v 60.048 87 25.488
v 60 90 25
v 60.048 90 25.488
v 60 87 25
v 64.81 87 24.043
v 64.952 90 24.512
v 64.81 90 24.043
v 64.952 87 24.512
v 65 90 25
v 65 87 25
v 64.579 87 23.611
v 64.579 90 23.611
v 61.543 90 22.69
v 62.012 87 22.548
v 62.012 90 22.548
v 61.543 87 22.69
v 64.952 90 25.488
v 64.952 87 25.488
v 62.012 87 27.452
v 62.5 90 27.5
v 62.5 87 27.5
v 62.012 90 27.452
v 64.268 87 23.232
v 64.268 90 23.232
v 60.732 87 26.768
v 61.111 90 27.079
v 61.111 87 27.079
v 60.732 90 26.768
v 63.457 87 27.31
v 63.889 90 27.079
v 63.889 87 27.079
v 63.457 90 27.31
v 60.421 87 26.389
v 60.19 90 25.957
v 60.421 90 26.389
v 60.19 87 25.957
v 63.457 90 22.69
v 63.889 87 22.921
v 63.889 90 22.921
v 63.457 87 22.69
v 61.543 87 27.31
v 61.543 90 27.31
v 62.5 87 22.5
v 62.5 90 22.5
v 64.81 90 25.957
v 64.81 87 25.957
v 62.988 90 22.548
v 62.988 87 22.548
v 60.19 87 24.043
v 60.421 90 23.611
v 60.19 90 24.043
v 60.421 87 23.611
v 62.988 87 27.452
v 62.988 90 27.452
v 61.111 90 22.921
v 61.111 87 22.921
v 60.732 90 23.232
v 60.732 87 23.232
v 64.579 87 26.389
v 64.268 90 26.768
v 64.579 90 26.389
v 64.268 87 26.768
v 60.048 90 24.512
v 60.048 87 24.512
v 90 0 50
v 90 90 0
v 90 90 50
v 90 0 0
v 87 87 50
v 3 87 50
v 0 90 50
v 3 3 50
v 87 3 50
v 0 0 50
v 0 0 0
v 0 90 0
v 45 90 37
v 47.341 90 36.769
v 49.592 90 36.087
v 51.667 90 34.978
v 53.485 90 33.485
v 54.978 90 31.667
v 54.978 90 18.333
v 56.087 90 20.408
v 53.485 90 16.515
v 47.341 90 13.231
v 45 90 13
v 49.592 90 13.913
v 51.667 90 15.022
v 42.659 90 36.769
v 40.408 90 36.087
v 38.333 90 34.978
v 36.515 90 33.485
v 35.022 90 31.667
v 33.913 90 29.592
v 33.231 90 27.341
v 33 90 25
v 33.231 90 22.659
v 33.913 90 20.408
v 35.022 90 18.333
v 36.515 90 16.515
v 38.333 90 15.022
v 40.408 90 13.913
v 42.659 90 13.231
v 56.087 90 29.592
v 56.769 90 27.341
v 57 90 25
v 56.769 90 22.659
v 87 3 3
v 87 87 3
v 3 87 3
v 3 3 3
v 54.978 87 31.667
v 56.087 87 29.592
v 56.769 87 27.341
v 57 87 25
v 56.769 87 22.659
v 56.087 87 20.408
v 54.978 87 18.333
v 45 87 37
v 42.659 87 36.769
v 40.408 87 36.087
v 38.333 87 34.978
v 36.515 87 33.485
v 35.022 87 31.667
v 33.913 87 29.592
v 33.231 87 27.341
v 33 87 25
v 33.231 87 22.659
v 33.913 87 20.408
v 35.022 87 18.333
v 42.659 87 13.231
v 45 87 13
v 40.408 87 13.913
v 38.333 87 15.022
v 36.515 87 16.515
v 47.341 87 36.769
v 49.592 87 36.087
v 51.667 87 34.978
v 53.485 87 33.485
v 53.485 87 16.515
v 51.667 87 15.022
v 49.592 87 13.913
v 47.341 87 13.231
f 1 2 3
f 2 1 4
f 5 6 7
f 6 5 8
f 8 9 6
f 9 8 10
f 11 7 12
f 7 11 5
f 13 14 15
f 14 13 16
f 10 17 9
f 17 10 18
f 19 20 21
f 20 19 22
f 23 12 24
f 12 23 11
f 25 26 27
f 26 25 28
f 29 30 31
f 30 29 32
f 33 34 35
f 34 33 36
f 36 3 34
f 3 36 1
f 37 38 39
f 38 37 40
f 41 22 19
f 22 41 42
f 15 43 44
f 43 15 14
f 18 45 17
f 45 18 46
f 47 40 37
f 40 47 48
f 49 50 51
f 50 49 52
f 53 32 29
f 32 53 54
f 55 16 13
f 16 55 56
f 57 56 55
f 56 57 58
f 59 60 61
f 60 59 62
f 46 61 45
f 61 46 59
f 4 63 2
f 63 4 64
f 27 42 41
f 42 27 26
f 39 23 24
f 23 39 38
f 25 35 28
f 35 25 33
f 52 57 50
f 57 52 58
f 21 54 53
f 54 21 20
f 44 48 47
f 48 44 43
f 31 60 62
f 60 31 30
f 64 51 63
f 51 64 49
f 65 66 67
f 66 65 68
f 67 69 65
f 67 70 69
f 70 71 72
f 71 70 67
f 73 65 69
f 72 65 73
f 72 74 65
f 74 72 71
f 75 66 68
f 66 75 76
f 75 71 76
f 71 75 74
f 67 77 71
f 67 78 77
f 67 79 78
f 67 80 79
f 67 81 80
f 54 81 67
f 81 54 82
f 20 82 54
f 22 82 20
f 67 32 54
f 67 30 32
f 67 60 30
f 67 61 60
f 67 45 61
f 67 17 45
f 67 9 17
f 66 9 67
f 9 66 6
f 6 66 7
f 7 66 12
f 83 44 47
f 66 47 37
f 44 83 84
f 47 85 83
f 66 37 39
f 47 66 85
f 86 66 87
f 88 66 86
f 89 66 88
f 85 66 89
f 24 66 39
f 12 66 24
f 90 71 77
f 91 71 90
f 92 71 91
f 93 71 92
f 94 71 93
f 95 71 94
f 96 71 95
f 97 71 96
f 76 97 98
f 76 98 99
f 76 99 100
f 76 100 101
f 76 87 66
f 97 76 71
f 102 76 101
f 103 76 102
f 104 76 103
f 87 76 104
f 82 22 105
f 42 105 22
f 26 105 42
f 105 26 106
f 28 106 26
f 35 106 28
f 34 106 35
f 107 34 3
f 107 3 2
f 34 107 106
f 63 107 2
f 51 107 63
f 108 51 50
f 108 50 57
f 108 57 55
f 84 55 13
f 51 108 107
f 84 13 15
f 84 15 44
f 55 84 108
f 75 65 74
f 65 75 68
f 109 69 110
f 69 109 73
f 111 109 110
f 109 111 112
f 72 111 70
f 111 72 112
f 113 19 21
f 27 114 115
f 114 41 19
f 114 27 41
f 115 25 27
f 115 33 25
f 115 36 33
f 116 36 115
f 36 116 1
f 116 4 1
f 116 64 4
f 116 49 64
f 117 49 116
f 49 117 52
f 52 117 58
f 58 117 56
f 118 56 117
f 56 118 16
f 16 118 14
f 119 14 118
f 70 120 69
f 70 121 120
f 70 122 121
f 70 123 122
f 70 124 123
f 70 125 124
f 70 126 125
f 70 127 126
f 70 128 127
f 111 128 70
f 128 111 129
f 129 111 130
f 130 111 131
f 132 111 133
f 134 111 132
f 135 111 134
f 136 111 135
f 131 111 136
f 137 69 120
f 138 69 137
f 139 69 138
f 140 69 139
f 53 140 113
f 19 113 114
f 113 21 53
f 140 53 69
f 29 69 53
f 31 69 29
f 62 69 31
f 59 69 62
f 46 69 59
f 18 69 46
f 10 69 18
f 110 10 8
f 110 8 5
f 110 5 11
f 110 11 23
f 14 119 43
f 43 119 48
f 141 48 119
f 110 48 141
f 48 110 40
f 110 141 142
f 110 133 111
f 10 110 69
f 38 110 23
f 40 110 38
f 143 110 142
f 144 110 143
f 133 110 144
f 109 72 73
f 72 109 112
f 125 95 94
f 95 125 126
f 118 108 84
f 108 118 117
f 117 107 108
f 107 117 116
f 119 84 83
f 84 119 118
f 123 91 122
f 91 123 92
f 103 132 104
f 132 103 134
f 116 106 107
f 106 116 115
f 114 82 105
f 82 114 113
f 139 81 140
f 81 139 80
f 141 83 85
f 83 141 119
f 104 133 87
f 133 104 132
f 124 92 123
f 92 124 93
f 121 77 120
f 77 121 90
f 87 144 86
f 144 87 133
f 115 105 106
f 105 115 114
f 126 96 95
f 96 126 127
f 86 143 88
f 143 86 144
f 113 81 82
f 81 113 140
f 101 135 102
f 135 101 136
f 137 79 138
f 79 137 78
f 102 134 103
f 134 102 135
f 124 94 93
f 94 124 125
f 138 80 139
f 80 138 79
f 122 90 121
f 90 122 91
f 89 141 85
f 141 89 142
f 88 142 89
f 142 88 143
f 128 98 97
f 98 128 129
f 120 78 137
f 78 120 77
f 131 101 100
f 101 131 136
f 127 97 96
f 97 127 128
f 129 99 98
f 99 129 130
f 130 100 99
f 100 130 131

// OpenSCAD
$fn = 32;

// ----------------------------------------------------------------------
// Vent box: roundvent enclosure
// ----------------------------------------------------------------------

// --- parameters (mm) ---
box_l = 90;               // box length, X
box_w = 90;               // box width, Y
box_h = 50;               // box height, Z
wall_t = 3;               // shell wall thickness
vent_d = 24;              // central vent diameter
ring_d = 5;               // ring hole diameter
n_ring = 8;               // holes in the ring
ring_r = 17.5;            // ring radius
fit_tol = 0.1;            // tolerance for press fits, mm
free_tol = 0.5;           // tolerance for clearance fits, mm

ring_step = 360 / n_ring;  // ring hole angular step

difference() {
  cube([box_l, box_w, box_h]);
  translate([wall_t, wall_t, wall_t])
    cube([box_l - 2 * wall_t, box_w - 2 * wall_t, box_h]);
  translate([box_l / 2, box_w - wall_t - 1, box_h / 2])
    rotate([-90, 0, 0]) cylinder(h = wall_t + 2, d = vent_d);
  for (i = [0 : n_ring - 1])
    translate([box_l / 2, box_w - wall_t - 1, box_h / 2])
      rotate([0, 0, i * ring_step])
        translate([ring_r, 0, 0]) rotate([-90, 0, 0])
          cylinder(h = wall_t + 2, d = ring_d);
}
